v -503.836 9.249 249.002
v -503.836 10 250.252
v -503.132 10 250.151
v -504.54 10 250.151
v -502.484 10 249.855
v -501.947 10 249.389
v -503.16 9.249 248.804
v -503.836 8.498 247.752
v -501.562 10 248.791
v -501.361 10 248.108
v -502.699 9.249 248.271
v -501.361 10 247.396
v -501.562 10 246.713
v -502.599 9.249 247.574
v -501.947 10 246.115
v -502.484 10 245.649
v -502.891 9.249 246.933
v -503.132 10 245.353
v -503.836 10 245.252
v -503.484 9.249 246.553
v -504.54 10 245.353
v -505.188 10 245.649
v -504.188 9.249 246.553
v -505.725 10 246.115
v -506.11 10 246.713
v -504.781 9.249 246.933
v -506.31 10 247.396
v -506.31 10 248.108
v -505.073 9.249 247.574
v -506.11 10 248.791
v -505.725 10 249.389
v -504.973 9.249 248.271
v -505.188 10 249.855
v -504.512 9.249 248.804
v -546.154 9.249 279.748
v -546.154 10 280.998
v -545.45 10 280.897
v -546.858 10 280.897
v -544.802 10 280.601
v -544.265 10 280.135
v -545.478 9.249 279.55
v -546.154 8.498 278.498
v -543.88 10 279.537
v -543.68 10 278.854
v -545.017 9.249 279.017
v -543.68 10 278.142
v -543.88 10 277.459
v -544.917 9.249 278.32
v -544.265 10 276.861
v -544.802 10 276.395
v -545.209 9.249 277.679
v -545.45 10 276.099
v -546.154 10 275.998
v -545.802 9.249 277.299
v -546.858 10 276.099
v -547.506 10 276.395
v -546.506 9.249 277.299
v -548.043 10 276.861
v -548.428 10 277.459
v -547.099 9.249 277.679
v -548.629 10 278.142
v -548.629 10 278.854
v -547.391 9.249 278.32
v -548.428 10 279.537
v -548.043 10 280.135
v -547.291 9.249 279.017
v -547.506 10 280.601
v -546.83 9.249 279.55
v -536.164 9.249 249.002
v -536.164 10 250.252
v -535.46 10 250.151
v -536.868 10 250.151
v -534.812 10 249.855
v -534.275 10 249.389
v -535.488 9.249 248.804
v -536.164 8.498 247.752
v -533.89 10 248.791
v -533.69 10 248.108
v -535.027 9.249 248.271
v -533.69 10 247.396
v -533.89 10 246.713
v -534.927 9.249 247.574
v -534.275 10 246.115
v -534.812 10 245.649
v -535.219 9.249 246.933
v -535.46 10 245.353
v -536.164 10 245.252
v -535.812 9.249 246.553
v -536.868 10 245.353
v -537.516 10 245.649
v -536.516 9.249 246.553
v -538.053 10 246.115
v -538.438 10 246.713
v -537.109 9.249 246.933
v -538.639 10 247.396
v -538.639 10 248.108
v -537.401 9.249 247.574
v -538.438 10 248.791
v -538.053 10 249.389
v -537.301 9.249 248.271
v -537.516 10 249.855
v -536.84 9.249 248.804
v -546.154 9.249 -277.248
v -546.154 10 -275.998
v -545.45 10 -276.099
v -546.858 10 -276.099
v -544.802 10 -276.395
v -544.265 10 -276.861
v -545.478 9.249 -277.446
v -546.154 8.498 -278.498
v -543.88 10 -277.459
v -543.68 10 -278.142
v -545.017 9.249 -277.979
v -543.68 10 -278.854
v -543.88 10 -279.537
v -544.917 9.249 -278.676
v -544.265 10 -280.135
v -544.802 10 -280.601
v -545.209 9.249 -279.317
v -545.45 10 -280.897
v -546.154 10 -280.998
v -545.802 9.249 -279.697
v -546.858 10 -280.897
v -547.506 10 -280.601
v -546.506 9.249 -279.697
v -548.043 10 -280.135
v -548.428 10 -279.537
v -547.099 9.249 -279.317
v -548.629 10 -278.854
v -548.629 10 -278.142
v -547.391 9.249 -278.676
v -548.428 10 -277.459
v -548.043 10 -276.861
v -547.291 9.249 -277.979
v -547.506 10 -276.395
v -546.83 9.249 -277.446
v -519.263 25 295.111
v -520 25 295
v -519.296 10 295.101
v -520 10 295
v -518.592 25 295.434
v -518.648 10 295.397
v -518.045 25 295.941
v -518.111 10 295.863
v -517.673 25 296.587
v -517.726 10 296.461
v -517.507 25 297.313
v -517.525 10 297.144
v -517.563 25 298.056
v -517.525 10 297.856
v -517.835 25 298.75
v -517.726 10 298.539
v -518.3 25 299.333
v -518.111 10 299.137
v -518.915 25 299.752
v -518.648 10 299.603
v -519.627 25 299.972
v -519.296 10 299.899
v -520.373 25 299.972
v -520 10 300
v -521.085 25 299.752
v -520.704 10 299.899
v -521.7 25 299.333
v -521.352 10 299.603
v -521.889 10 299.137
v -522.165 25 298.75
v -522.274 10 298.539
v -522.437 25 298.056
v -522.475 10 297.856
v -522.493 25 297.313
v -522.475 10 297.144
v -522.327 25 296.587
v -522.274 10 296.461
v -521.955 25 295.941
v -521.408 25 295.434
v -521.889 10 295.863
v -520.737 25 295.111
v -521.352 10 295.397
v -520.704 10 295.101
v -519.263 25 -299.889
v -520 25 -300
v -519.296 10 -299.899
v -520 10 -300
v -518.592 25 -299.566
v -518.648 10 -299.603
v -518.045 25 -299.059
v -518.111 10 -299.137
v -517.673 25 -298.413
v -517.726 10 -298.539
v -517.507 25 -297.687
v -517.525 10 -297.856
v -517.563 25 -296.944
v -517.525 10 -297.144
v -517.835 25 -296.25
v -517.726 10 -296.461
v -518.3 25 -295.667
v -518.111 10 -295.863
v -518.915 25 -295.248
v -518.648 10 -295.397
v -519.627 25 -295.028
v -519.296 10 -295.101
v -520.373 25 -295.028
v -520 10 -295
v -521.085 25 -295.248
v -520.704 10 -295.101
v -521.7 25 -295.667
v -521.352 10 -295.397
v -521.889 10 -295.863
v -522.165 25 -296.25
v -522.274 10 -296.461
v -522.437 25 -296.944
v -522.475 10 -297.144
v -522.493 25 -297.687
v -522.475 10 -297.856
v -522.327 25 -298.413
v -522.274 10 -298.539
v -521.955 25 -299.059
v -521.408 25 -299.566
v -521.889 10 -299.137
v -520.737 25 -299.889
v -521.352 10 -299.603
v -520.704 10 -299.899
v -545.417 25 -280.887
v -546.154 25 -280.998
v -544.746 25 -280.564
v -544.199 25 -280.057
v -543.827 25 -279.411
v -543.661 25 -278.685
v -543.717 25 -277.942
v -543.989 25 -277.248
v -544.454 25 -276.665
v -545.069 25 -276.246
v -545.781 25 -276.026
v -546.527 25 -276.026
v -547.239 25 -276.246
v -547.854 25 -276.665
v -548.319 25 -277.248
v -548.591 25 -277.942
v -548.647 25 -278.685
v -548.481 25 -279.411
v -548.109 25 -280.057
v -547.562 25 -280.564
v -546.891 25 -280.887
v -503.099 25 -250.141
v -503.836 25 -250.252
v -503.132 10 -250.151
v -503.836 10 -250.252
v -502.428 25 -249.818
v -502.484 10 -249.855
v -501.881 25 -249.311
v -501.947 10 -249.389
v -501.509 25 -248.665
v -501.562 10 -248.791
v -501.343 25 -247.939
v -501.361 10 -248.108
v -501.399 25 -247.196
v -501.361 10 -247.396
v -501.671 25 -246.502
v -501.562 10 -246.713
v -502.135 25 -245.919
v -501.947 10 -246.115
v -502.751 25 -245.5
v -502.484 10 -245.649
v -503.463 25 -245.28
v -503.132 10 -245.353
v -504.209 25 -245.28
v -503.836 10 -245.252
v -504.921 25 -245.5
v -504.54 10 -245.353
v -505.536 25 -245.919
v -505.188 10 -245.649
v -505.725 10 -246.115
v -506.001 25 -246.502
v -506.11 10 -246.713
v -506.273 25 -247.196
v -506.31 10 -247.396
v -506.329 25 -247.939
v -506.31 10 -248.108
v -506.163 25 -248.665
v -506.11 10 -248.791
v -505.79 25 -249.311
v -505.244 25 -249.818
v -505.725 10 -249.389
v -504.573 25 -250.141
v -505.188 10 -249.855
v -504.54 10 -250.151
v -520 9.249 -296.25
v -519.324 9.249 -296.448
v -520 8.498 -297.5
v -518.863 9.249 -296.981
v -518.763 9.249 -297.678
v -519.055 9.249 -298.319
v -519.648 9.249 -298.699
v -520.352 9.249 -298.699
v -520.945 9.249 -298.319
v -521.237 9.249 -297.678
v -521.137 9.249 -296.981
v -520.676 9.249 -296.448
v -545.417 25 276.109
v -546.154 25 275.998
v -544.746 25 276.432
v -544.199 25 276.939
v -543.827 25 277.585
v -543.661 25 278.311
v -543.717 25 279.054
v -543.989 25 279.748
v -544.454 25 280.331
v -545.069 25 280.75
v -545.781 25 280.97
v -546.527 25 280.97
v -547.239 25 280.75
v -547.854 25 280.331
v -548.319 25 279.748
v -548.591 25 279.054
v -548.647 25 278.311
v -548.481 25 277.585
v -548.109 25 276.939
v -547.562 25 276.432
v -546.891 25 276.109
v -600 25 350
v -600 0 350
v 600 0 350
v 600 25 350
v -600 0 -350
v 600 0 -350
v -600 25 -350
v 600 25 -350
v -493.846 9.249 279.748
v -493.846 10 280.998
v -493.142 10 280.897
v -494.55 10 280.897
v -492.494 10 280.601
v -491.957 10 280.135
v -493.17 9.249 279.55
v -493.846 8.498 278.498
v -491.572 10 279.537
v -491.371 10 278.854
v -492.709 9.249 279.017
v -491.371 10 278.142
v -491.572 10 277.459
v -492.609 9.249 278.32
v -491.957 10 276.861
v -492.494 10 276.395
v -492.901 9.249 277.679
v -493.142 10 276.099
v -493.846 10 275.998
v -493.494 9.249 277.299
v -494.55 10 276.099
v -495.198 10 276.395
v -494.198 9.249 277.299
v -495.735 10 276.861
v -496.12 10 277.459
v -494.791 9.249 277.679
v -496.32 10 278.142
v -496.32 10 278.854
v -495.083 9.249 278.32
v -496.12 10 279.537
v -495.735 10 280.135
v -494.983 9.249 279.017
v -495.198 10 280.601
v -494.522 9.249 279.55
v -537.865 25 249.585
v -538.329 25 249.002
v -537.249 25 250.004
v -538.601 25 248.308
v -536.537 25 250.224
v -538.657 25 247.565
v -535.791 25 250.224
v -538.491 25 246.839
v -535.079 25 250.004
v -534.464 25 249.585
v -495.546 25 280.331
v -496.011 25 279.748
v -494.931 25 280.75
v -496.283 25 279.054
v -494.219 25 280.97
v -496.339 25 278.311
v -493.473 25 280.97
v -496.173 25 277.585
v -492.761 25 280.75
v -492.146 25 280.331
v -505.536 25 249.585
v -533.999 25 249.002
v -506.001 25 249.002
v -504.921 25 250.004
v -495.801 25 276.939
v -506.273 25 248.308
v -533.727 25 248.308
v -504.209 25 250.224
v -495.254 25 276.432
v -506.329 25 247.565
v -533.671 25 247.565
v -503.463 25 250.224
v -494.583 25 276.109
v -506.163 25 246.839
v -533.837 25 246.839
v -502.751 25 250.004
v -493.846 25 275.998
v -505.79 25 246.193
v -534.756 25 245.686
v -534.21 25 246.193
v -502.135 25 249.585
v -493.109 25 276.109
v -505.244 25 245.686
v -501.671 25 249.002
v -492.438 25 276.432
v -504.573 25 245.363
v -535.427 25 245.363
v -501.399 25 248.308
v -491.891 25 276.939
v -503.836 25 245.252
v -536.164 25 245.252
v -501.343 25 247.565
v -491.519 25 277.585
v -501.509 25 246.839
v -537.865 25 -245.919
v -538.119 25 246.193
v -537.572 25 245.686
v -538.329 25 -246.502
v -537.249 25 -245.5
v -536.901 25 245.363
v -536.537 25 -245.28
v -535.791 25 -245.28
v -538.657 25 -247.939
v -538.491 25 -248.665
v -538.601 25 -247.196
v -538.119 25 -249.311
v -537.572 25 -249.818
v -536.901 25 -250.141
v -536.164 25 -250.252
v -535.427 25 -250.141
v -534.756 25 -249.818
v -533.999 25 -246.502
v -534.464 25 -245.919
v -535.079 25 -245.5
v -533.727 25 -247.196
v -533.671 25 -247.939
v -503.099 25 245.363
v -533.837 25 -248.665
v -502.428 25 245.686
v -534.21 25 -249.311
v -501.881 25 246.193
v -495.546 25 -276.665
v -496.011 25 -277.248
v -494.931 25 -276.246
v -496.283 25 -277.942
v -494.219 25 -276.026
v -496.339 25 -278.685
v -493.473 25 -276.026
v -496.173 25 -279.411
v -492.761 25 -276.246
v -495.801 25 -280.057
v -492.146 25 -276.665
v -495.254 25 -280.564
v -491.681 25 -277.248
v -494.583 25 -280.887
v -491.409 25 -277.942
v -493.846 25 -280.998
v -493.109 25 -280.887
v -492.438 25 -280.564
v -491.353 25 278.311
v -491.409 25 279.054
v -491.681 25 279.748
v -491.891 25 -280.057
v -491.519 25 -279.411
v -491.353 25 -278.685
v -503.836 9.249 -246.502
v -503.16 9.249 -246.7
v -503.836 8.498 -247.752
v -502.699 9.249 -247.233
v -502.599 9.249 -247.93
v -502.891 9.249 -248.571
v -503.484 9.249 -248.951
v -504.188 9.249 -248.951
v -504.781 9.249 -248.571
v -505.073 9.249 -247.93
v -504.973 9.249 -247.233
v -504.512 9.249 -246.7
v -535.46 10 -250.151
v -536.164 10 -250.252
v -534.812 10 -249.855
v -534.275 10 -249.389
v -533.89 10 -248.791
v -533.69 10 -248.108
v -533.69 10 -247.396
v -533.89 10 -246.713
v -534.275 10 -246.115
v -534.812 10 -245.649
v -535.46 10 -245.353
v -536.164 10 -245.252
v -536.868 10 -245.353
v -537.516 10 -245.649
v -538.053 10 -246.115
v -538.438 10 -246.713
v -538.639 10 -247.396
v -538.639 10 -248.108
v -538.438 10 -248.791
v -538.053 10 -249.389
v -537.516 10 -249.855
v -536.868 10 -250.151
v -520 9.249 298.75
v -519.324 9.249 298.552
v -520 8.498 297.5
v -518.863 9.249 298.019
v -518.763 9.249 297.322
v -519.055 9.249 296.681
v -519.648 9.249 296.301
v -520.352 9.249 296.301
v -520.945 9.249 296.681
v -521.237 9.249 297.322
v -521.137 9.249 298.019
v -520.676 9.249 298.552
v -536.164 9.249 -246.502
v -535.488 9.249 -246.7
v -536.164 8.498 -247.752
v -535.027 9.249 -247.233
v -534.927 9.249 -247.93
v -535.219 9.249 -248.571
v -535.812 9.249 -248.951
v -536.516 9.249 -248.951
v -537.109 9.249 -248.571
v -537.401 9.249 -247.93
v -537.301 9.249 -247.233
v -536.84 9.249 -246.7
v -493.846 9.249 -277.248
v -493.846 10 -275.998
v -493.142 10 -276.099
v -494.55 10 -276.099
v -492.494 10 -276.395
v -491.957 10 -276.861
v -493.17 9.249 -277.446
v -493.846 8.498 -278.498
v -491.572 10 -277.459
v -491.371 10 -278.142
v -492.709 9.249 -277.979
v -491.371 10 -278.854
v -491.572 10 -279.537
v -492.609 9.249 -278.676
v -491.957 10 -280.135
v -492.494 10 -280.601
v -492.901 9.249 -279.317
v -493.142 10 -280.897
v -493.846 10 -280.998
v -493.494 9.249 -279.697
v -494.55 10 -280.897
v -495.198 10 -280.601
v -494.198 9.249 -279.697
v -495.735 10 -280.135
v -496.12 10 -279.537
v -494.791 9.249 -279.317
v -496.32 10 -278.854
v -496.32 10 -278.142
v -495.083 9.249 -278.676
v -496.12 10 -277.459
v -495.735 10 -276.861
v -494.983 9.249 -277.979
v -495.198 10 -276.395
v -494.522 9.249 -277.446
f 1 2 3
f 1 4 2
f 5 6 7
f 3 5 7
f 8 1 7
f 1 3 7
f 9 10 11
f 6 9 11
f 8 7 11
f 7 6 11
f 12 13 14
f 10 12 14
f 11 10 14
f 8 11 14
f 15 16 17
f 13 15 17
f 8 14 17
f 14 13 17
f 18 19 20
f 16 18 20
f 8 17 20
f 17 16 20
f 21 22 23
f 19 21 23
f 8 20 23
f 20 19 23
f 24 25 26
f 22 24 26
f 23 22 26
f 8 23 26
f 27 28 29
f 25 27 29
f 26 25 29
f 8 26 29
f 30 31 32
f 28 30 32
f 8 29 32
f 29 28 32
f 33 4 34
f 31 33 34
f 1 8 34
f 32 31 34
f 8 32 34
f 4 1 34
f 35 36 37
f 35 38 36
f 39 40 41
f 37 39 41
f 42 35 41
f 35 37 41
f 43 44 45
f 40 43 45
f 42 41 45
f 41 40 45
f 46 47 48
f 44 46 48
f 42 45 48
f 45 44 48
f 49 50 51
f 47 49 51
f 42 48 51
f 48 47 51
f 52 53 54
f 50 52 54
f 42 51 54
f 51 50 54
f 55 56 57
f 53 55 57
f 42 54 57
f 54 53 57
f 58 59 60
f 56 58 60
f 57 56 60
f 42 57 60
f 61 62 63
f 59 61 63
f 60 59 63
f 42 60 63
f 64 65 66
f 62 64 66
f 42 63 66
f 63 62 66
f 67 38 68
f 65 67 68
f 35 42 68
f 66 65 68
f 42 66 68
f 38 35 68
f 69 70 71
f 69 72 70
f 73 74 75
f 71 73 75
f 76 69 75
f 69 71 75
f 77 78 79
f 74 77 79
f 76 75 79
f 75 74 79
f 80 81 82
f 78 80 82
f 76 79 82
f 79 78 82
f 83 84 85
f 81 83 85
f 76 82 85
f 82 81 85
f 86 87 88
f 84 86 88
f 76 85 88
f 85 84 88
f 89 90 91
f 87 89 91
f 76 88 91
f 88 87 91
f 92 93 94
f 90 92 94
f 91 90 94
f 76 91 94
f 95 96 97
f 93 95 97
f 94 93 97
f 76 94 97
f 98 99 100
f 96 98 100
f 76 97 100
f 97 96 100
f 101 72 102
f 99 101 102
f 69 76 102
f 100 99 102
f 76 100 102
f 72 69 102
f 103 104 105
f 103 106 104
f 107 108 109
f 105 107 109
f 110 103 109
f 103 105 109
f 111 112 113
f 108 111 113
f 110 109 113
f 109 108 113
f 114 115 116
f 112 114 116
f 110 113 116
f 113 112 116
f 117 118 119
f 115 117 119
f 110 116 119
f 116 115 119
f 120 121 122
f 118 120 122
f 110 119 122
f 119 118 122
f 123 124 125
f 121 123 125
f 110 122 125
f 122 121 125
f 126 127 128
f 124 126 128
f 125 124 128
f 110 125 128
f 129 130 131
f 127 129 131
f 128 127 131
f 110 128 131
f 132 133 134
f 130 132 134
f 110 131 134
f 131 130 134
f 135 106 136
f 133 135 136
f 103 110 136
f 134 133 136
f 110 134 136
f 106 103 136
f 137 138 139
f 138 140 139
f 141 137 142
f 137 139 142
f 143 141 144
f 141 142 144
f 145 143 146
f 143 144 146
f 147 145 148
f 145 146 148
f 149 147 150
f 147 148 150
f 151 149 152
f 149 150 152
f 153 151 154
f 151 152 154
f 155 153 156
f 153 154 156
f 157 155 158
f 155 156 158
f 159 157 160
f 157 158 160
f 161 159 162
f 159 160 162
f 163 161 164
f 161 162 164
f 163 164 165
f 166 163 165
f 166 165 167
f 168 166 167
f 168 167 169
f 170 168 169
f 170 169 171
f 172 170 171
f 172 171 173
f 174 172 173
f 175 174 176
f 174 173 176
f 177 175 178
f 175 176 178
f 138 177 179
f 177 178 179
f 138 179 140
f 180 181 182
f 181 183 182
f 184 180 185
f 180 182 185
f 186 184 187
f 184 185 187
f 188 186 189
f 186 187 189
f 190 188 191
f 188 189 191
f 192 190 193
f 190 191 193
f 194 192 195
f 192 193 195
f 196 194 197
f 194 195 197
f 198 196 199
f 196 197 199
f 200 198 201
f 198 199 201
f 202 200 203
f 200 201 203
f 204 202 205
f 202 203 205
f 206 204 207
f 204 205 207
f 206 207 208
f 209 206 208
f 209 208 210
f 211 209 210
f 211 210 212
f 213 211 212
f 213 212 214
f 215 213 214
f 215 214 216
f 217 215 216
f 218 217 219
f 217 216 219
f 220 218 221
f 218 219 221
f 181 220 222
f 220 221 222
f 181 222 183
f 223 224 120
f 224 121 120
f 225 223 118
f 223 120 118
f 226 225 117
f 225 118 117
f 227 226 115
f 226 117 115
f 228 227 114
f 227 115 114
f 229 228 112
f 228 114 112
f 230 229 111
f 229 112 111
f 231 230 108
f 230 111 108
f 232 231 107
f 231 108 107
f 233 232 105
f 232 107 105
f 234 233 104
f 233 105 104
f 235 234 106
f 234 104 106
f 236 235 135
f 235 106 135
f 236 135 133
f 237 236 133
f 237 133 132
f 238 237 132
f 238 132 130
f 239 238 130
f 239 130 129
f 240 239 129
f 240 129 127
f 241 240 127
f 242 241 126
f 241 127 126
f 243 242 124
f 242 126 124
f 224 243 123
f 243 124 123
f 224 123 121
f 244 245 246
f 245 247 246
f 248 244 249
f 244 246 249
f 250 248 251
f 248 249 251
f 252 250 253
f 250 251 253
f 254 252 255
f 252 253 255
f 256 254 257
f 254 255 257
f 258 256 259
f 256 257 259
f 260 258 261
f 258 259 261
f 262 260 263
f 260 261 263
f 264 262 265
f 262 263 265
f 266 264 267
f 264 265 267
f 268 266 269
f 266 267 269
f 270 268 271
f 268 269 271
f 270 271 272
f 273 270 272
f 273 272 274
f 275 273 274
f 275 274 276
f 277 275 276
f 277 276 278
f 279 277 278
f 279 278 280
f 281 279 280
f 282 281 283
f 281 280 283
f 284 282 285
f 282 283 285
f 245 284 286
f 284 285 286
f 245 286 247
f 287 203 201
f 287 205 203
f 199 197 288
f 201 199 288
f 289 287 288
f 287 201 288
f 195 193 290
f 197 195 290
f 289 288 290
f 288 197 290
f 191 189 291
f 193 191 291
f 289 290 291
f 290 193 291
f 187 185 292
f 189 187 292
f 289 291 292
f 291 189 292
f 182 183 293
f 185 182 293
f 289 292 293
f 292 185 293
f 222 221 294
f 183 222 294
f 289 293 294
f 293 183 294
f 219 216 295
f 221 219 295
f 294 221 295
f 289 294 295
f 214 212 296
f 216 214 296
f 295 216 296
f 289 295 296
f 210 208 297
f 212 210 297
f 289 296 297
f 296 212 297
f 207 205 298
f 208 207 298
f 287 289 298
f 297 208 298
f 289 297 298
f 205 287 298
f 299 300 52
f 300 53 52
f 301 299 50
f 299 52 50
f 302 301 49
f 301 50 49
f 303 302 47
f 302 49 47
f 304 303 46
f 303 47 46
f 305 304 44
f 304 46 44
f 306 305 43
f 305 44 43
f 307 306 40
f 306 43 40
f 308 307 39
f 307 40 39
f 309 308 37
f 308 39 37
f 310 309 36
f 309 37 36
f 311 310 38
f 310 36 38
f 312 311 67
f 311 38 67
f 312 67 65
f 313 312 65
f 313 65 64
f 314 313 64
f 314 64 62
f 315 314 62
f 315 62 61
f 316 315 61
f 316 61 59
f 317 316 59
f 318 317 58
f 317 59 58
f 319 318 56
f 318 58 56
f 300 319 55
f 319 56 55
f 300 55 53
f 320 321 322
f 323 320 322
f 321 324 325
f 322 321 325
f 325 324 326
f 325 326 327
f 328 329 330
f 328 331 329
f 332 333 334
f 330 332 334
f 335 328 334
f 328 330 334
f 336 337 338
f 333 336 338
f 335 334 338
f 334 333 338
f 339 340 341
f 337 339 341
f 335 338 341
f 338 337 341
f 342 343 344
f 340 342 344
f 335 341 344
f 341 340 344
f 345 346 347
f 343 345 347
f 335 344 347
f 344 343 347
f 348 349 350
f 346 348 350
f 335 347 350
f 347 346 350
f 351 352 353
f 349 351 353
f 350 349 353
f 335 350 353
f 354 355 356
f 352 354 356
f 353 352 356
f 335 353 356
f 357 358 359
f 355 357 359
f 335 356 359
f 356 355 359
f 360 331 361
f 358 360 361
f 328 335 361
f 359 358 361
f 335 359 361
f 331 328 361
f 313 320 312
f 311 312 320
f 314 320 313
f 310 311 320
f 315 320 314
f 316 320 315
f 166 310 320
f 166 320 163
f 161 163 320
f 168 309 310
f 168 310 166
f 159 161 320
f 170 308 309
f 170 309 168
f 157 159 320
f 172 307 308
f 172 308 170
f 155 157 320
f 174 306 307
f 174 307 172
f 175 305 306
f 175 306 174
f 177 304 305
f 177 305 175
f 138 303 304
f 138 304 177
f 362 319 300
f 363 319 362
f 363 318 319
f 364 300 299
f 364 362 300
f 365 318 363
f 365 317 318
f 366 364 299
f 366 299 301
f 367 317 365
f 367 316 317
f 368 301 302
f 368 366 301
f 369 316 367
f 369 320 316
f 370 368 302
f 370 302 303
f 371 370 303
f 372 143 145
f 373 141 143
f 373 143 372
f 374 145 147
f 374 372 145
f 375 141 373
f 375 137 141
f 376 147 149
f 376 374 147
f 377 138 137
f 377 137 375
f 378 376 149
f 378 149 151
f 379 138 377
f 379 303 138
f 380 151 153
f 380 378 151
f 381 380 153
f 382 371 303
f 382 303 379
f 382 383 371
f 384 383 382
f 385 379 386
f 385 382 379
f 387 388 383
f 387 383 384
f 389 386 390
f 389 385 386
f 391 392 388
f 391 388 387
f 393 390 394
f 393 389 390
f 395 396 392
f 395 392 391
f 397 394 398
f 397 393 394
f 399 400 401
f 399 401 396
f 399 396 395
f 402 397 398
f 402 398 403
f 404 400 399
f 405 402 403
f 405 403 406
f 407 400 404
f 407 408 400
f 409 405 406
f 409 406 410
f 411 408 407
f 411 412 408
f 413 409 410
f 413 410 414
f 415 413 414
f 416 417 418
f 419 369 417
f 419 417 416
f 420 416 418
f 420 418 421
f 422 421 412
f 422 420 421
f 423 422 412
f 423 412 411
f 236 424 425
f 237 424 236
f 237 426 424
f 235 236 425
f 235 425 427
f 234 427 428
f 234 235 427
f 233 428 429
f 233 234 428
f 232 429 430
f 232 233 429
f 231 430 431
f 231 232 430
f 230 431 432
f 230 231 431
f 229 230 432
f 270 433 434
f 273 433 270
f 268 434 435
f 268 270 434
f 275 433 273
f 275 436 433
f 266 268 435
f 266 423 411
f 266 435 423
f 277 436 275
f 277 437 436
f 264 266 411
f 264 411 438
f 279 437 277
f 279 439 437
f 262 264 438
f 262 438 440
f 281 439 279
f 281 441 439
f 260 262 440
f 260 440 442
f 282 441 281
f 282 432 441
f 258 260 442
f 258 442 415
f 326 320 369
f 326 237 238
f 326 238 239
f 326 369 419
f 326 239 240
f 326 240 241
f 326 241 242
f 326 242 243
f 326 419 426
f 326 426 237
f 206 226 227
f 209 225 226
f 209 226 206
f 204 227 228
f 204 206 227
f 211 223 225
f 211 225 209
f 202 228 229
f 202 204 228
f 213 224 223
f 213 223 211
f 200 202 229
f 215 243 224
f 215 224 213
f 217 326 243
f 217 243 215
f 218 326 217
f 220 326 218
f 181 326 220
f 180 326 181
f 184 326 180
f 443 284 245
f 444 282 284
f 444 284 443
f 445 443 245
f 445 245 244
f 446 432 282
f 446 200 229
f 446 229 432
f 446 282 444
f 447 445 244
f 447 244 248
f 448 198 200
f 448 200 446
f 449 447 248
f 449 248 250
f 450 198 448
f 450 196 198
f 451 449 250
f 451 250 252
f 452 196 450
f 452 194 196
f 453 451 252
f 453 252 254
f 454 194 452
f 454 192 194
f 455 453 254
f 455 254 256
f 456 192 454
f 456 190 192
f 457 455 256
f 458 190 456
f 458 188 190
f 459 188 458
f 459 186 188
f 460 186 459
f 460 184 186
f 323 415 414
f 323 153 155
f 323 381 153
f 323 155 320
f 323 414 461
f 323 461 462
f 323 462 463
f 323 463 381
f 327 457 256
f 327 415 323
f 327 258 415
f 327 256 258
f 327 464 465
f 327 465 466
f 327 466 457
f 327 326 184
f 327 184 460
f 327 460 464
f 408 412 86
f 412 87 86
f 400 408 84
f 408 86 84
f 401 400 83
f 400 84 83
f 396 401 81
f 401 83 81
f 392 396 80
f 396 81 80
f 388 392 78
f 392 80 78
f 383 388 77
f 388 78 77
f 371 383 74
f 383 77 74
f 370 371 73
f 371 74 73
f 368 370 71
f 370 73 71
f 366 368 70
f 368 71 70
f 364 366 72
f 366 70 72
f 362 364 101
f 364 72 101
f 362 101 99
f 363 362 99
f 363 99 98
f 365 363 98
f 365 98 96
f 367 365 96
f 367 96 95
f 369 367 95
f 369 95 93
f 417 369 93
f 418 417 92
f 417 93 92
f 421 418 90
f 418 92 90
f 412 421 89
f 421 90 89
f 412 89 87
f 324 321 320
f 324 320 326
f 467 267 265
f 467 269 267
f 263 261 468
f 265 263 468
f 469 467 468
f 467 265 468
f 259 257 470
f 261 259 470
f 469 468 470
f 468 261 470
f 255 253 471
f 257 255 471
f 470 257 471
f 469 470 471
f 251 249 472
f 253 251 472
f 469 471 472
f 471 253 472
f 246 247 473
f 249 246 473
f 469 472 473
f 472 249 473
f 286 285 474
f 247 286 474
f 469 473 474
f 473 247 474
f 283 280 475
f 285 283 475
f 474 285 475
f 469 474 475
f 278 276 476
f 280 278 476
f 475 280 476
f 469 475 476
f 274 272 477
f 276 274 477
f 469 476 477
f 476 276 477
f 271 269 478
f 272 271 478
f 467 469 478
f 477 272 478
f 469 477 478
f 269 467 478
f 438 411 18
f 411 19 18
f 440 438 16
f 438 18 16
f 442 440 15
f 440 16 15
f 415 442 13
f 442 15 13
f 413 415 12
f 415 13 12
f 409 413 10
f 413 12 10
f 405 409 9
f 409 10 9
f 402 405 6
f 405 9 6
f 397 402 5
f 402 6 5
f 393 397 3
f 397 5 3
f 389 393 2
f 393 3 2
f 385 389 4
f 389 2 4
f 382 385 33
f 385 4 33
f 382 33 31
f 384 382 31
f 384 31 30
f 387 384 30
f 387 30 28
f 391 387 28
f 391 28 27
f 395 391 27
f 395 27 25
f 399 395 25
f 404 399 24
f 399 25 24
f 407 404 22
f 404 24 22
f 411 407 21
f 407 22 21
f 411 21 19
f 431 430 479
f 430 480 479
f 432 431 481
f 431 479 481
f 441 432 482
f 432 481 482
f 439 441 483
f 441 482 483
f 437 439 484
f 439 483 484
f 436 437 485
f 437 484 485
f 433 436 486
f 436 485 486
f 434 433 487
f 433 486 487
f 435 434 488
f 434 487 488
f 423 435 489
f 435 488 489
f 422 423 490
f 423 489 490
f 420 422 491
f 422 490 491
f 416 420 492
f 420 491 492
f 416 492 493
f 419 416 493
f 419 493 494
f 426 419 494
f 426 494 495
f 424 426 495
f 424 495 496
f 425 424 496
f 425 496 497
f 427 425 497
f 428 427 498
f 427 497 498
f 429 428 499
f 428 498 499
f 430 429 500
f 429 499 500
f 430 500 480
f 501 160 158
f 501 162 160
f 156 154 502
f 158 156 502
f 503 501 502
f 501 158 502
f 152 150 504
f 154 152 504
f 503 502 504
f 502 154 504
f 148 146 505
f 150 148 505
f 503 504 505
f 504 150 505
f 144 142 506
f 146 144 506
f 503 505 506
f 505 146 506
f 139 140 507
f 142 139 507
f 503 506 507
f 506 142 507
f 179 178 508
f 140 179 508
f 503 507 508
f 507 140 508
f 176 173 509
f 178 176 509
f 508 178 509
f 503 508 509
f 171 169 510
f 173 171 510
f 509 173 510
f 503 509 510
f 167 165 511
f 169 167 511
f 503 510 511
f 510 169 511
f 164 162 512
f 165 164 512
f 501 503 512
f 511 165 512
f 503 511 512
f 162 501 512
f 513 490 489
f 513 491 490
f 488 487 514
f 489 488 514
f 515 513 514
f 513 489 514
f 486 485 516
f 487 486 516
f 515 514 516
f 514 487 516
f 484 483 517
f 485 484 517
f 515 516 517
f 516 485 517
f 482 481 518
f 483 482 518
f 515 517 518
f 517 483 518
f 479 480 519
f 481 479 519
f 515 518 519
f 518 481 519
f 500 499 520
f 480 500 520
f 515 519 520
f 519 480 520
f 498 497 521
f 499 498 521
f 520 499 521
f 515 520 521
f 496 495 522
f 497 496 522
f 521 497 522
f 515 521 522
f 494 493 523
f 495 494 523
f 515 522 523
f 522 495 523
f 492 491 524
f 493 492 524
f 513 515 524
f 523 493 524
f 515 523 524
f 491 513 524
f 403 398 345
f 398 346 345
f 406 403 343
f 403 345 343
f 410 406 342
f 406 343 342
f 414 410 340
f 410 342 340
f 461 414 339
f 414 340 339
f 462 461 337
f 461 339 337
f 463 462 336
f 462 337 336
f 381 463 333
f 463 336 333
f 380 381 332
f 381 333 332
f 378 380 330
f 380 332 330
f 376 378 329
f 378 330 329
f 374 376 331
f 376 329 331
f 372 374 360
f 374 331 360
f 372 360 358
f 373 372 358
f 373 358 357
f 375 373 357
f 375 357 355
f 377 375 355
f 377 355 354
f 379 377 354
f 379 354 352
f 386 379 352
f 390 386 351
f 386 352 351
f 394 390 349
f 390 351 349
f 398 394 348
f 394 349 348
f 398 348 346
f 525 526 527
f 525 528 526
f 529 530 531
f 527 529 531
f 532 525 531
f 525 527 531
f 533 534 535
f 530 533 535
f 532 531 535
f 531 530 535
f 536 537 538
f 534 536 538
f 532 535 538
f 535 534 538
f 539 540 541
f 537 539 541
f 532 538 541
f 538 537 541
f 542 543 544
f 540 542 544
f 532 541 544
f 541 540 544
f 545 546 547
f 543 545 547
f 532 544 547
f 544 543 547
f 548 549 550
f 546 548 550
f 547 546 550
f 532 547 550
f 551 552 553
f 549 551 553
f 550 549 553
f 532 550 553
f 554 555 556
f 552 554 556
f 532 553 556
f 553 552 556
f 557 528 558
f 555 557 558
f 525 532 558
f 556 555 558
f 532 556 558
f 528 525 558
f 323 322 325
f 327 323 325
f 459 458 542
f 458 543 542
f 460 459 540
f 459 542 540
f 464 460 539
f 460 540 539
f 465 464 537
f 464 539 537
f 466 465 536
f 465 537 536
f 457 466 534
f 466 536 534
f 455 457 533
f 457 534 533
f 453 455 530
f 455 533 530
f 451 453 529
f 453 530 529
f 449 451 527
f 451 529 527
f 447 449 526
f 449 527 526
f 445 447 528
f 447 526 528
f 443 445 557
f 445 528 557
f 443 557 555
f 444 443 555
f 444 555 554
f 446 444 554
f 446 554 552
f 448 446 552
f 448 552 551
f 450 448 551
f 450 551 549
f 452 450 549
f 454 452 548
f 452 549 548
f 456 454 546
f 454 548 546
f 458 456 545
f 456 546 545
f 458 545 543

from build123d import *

# Parameters (mm, degrees)
SKETCH1_W                   = 1200
SKETCH1_H                   = 700
BOSS_EXTRUDE1_DEPTH         = 25
TAP_DRILL_FOR_M6_TAP1_D     = 5
TAP_DRILL_FOR_M6_TAP1_DEPTH = 15
TAP_DRILL_FOR_M6_TAP1_TIP   = 1.502151548


with BuildPart() as part:
    # Sketch1 → Boss-Extrude1 (new body)
    with BuildSketch(Plane(origin=(0, 0, 0), x_dir=(1, 0, 0), z_dir=(0, 1, 0))):
        Rectangle(SKETCH1_W, SKETCH1_H)
    extrude(amount=BOSS_EXTRUDE1_DEPTH)

    # Tap Drill for M6 Tap1
    with Locations(Plane(origin=(-493.845945802, 25, -278.497967345), x_dir=(0, 0, 1), z_dir=(0, 1, 0))):
        with Locations((0, 0), (-19.002032655, -26.154054198), (0, -52.308108396), (30.74593469, -42.318148636), (30.74593469, -9.98995976), (556.99593469, 0), (526.25, -9.98995976), (526.25, -42.318148636), (556.99593469, -52.308108396), (575.997967345, -26.154054198)):
            Hole(TAP_DRILL_FOR_M6_TAP1_D / 2, depth=TAP_DRILL_FOR_M6_TAP1_DEPTH)
            with Locations((0, 0, -(TAP_DRILL_FOR_M6_TAP1_DEPTH + TAP_DRILL_FOR_M6_TAP1_TIP / 2))):  # 118° drill point
                Cone(0, TAP_DRILL_FOR_M6_TAP1_D / 2, TAP_DRILL_FOR_M6_TAP1_TIP, mode=Mode.SUBTRACT)


solid = part.part
